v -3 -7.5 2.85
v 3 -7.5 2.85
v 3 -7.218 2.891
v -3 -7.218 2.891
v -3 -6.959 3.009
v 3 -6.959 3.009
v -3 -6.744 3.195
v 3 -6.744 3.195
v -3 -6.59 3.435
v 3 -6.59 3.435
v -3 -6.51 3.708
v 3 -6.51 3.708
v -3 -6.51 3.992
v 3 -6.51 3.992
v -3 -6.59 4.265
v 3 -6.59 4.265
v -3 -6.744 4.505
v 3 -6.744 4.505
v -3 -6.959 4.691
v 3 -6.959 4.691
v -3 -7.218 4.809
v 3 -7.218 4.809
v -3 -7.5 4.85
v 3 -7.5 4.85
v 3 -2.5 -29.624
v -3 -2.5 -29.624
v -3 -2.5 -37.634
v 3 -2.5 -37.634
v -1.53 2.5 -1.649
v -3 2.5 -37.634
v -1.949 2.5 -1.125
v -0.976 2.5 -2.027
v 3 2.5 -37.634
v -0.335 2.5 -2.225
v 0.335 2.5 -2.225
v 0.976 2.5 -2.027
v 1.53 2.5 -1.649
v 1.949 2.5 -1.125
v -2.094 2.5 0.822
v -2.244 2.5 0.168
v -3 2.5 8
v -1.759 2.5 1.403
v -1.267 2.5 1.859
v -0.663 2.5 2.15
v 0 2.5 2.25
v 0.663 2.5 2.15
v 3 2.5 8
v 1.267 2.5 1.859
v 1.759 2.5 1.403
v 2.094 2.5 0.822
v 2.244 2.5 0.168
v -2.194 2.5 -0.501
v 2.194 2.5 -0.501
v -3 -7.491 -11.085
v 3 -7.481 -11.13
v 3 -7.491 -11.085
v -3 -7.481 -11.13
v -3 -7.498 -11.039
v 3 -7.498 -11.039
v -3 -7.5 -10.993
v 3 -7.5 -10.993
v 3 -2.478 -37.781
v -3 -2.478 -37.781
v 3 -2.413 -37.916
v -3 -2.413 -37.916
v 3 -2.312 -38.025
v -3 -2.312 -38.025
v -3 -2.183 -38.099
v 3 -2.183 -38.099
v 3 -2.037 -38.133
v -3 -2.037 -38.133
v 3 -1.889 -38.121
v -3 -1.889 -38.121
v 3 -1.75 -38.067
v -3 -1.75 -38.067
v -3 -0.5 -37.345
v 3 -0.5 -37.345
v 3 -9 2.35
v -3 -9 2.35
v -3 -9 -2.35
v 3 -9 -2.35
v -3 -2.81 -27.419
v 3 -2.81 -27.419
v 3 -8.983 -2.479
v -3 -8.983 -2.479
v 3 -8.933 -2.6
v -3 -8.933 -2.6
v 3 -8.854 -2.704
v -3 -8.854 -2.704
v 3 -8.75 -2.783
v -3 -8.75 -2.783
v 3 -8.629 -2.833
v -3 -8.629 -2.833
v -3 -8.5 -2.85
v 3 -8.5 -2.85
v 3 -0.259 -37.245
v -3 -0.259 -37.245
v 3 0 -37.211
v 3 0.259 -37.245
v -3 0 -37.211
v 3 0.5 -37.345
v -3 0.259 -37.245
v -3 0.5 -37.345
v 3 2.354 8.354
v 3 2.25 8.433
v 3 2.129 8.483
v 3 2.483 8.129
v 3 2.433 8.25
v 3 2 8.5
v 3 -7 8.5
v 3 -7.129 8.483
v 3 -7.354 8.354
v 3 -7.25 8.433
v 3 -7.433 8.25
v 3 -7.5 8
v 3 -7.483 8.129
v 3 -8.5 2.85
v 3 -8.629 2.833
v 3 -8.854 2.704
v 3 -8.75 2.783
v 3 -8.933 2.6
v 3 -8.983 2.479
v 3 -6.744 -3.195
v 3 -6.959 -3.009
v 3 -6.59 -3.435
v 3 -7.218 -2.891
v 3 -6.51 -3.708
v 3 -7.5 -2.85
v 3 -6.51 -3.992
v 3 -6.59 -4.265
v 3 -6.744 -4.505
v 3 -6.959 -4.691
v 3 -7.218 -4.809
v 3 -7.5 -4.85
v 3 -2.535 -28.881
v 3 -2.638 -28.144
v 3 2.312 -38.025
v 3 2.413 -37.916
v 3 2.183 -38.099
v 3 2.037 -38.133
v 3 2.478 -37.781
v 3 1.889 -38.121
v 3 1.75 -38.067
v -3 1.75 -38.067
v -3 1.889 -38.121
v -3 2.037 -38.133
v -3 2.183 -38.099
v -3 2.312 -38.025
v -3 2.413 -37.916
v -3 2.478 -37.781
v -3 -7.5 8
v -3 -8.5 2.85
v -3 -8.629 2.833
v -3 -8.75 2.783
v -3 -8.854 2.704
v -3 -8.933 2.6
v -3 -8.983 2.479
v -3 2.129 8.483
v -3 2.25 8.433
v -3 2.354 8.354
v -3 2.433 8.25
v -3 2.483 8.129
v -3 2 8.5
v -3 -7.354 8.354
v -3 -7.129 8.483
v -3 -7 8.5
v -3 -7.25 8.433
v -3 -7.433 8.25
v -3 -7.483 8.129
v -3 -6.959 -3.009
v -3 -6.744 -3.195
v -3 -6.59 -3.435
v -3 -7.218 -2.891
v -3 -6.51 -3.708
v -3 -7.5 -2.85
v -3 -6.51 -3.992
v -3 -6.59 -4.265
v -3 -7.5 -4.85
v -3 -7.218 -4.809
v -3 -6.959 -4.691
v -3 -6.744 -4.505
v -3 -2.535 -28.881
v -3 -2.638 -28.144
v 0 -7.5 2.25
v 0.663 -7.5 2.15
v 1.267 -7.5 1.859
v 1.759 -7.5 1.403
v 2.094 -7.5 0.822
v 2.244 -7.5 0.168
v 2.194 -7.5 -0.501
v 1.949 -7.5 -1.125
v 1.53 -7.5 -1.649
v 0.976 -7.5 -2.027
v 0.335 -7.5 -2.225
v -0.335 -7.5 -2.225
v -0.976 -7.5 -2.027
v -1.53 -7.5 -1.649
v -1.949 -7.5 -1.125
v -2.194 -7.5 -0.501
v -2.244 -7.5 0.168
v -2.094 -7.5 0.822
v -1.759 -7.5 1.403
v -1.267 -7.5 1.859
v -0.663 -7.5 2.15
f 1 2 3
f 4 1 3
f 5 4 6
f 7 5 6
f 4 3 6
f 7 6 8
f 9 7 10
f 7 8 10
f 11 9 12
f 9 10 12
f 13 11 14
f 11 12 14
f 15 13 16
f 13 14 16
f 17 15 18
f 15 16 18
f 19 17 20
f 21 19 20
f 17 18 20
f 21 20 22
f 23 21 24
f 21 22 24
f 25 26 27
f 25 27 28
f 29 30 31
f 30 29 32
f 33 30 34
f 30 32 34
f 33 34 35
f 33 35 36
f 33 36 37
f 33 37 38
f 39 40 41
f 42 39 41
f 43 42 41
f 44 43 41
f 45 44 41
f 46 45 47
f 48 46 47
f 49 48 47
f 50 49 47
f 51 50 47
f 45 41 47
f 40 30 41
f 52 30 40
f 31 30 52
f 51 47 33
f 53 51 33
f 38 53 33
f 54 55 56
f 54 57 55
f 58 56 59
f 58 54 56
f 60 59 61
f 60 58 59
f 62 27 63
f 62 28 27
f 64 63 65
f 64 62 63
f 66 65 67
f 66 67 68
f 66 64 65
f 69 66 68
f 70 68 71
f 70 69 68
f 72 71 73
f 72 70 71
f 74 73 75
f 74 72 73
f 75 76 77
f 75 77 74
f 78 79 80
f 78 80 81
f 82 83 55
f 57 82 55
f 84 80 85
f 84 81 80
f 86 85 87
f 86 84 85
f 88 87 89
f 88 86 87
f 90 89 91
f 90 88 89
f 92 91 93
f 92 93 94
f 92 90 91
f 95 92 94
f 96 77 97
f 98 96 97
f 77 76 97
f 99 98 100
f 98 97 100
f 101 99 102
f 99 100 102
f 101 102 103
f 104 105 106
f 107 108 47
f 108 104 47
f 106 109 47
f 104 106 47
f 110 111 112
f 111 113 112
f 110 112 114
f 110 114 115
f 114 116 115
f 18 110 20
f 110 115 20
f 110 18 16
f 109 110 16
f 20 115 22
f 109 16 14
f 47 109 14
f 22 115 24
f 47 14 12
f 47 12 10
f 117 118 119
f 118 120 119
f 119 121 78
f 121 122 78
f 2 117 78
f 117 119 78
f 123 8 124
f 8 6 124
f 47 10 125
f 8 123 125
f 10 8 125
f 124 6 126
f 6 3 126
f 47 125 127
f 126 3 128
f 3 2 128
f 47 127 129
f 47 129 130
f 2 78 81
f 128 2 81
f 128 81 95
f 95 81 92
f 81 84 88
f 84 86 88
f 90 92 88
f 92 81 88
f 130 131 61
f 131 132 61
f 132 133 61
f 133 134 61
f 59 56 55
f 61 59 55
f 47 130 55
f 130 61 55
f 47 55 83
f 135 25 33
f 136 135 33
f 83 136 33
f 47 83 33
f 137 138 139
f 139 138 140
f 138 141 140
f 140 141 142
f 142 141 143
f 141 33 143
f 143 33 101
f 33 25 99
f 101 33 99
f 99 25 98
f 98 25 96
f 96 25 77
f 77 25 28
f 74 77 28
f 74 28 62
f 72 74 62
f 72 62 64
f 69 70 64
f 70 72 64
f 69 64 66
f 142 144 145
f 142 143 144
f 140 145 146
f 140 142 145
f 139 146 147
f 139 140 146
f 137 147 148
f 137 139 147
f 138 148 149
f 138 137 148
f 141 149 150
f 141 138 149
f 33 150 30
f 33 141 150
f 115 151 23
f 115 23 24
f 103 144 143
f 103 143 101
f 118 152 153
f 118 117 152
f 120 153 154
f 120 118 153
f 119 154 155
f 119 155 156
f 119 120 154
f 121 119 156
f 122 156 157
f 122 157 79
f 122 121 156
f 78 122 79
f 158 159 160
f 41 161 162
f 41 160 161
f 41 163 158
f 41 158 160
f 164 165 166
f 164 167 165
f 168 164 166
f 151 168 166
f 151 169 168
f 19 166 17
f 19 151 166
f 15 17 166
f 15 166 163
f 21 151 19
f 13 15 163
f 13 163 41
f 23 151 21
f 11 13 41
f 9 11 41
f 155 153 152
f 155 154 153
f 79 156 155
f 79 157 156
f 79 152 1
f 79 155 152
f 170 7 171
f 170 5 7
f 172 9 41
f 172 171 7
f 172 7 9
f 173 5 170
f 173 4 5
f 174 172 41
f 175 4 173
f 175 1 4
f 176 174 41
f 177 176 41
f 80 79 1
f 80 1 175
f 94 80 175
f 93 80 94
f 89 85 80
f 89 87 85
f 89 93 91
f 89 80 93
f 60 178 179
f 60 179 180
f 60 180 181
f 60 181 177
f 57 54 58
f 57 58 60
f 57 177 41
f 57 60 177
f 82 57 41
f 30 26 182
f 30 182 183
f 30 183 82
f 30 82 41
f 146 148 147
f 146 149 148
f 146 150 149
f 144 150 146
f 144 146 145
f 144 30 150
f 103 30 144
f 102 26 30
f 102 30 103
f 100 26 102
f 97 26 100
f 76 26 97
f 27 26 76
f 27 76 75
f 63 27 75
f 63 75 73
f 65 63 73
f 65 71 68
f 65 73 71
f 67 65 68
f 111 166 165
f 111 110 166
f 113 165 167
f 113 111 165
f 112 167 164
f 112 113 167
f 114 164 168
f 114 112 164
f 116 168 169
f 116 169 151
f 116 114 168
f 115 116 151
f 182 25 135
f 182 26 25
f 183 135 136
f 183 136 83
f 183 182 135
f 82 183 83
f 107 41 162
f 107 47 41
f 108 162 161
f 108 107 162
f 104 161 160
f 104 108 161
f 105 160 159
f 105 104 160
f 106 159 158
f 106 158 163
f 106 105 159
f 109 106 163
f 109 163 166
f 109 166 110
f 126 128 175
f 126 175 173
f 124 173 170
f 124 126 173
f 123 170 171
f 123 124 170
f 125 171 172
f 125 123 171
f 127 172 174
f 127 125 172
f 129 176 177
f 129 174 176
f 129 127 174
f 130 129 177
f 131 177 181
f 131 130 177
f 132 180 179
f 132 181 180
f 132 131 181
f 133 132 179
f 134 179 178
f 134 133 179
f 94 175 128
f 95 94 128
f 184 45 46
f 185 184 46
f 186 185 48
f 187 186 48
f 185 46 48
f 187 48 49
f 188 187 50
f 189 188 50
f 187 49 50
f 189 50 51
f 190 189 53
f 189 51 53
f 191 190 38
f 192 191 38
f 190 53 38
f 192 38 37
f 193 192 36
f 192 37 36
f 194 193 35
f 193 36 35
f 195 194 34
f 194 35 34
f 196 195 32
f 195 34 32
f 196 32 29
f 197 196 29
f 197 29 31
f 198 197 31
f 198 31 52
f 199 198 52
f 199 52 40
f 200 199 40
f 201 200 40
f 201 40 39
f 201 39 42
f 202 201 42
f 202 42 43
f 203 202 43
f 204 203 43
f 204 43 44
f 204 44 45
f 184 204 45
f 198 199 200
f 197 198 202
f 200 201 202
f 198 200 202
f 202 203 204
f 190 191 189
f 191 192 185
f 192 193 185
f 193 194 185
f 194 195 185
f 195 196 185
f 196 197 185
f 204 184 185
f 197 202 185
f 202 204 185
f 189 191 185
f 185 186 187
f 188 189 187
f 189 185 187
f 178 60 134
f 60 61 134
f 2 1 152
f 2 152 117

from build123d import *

# Parameters (mm, degrees)
ESQUISSE1_W             = 6
ESQUISSE1_H             = 5
BOSS_EXTRU_1_DEPTH      = 8.5
ESQUISSE5_W             = 6
ESQUISSE5_H             = 5
BOSS_EXTRU_3_DEPTH      = 30
ENL_V_MAT_EXTRU_2_DEPTH = 40.044846011
ESQUISSE7_W             = 6
ESQUISSE7_H             = 17
BOSS_EXTRU_4_DEPTH      = 5
ESQUISSE2_R             = 2.25
ENL_V_MAT_EXTRU_1_DEPTH = 40.890475054
ESQUISSE9_W             = 6
ESQUISSE9_H             = 5.7
BOSS_EXTRU_6_DEPTH      = 1.5
ENL_V_MAT_EXTRU_3_DEPTH = 40.990623901
CHANFREIN2_SIZE         = 20
CHANFREIN2_SIZE_2       = 5.734907715
CONG_1_R                = 0.5
CONG_2_R                = 1
CONG_3_R                = 8


with BuildPart() as part:
    # Esquisse1 → Boss.-Extru.1 (new, symmetric)
    with BuildSketch(Plane.XY):
        Rectangle(ESQUISSE1_W, ESQUISSE1_H)
    extrude(amount=BOSS_EXTRU_1_DEPTH, both=True)

    # Esquisse5 → Boss.-Extru.3 (add)
    with BuildSketch(Plane(origin=(-2.5, 0, -8.5), x_dir=(1, 0, 0), z_dir=(0, 0, 1))):
        with Locations((2.5, 0)):
            Rectangle(ESQUISSE5_W, ESQUISSE5_H)
    extrude(amount=-BOSS_EXTRU_3_DEPTH)

    # Esquisse6 → Enlèv. mat.-Extru.2 (cut, through all)
    with BuildSketch(Plane(origin=(3, 0, 0), x_dir=(0, 0, -1), z_dir=(1, 0, 0))):
        Polygon((38.5, 2.5), (37.056624327, 0), (38.5, -2.5), align=None)
    extrude(amount=-ENL_V_MAT_EXTRU_2_DEPTH, mode=Mode.SUBTRACT)

    # Esquisse7 → Boss.-Extru.4 (add)
    with BuildSketch(Plane.XZ.offset(2.5)):
        Rectangle(ESQUISSE7_W, ESQUISSE7_H)
    extrude(amount=BOSS_EXTRU_4_DEPTH)

    # Esquisse2 → Enlèv. mat.-Extru.1 (cut, through all)
    with BuildSketch(Plane(origin=(0, 2.5, 0), x_dir=(1, 0, 0), z_dir=(0, 1, 0))):
        with Locations(Location((0, 0, 0), (0, 0, 270))):
            Circle(ESQUISSE2_R)
    extrude(amount=-ENL_V_MAT_EXTRU_1_DEPTH, mode=Mode.SUBTRACT)

    # Esquisse9 → Boss.-Extru.6 (add)
    with BuildSketch(Plane.XZ.offset(7.5)):
        Rectangle(ESQUISSE9_W, ESQUISSE9_H)
    extrude(amount=BOSS_EXTRU_6_DEPTH)

    # Esquisse10 → Enlèv. mat.-Extru.3 (cut, through all)
    with BuildSketch(Plane(origin=(3, 0, 0), x_dir=(0, 0, -1), z_dir=(1, 0, 0))):
        with BuildLine():
            Line((-4.85, -7.5), (-2.85, -7.5))
            ThreePointArc((-2.85, -7.5), (-3.85, -6.5), (-4.85, -7.5))
        make_face()
        with BuildLine():
            Line((4.85, -7.5), (2.85, -7.5))
            ThreePointArc((2.85, -7.5), (3.85, -6.5), (4.85, -7.5))
        make_face()
    extrude(amount=-ENL_V_MAT_EXTRU_3_DEPTH, mode=Mode.SUBTRACT)

    # Chanfrein2
    # the kernel refuses this chamfer: 20, 5.734907715 mm, written as the material it adds along each edge
    with BuildSketch(Plane(origin=(3, -2.5, -8.5), x_dir=(0, 0.010616657410321303, -0.9999436417045873), z_dir=(-1, 0, 0))) as chanfrein2_piece_1_section:
        Polygon((CHANFREIN2_SIZE * 0.999943641705, CHANFREIN2_SIZE * 0.0106166574103), (-CHANFREIN2_SIZE_2 * 0.0106166574106, CHANFREIN2_SIZE_2 * 0.999943641735), (0, 0), align=None)
    chanfrein2_piece_1 = extrude(amount=6, mode=Mode.PRIVATE)
    chanfrein2_piece_1 = split(chanfrein2_piece_1, bisect_by=Plane(origin=(0, -7.5, -15.61390523), z_dir=(0, 1, 0)), keep=Keep.TOP, mode=Mode.PRIVATE)
    add(chanfrein2_piece_1)

    # Congé1
    cong_1_edges = [part.edges().sort_by_distance(p)[0] for p in [
        (0, -2.5, -38.5),
        (0, 2.5, -38.5),
        (0, -7.5, 8.5),
        (0, -9, 2.85),
        (0, -9, -2.85),
        (0, 2.5, 8.5),
        (0, -7.5, -11.062927781),
    ]]
    fillet(cong_1_edges, radius=CONG_1_R)

    # Congé2
    cong_2_edges = [part.edges().sort_by_distance(p)[0] for p in [
        (0, 0, -37.056624327),
    ]]
    fillet(cong_2_edges, radius=CONG_2_R)

    # Congé3
    cong_3_edges = [part.edges().sort_by_distance(p)[0] for p in [
        (0, -2.5, -28.5),
    ]]
    fillet(cong_3_edges, radius=CONG_3_R)


solid = part.part
